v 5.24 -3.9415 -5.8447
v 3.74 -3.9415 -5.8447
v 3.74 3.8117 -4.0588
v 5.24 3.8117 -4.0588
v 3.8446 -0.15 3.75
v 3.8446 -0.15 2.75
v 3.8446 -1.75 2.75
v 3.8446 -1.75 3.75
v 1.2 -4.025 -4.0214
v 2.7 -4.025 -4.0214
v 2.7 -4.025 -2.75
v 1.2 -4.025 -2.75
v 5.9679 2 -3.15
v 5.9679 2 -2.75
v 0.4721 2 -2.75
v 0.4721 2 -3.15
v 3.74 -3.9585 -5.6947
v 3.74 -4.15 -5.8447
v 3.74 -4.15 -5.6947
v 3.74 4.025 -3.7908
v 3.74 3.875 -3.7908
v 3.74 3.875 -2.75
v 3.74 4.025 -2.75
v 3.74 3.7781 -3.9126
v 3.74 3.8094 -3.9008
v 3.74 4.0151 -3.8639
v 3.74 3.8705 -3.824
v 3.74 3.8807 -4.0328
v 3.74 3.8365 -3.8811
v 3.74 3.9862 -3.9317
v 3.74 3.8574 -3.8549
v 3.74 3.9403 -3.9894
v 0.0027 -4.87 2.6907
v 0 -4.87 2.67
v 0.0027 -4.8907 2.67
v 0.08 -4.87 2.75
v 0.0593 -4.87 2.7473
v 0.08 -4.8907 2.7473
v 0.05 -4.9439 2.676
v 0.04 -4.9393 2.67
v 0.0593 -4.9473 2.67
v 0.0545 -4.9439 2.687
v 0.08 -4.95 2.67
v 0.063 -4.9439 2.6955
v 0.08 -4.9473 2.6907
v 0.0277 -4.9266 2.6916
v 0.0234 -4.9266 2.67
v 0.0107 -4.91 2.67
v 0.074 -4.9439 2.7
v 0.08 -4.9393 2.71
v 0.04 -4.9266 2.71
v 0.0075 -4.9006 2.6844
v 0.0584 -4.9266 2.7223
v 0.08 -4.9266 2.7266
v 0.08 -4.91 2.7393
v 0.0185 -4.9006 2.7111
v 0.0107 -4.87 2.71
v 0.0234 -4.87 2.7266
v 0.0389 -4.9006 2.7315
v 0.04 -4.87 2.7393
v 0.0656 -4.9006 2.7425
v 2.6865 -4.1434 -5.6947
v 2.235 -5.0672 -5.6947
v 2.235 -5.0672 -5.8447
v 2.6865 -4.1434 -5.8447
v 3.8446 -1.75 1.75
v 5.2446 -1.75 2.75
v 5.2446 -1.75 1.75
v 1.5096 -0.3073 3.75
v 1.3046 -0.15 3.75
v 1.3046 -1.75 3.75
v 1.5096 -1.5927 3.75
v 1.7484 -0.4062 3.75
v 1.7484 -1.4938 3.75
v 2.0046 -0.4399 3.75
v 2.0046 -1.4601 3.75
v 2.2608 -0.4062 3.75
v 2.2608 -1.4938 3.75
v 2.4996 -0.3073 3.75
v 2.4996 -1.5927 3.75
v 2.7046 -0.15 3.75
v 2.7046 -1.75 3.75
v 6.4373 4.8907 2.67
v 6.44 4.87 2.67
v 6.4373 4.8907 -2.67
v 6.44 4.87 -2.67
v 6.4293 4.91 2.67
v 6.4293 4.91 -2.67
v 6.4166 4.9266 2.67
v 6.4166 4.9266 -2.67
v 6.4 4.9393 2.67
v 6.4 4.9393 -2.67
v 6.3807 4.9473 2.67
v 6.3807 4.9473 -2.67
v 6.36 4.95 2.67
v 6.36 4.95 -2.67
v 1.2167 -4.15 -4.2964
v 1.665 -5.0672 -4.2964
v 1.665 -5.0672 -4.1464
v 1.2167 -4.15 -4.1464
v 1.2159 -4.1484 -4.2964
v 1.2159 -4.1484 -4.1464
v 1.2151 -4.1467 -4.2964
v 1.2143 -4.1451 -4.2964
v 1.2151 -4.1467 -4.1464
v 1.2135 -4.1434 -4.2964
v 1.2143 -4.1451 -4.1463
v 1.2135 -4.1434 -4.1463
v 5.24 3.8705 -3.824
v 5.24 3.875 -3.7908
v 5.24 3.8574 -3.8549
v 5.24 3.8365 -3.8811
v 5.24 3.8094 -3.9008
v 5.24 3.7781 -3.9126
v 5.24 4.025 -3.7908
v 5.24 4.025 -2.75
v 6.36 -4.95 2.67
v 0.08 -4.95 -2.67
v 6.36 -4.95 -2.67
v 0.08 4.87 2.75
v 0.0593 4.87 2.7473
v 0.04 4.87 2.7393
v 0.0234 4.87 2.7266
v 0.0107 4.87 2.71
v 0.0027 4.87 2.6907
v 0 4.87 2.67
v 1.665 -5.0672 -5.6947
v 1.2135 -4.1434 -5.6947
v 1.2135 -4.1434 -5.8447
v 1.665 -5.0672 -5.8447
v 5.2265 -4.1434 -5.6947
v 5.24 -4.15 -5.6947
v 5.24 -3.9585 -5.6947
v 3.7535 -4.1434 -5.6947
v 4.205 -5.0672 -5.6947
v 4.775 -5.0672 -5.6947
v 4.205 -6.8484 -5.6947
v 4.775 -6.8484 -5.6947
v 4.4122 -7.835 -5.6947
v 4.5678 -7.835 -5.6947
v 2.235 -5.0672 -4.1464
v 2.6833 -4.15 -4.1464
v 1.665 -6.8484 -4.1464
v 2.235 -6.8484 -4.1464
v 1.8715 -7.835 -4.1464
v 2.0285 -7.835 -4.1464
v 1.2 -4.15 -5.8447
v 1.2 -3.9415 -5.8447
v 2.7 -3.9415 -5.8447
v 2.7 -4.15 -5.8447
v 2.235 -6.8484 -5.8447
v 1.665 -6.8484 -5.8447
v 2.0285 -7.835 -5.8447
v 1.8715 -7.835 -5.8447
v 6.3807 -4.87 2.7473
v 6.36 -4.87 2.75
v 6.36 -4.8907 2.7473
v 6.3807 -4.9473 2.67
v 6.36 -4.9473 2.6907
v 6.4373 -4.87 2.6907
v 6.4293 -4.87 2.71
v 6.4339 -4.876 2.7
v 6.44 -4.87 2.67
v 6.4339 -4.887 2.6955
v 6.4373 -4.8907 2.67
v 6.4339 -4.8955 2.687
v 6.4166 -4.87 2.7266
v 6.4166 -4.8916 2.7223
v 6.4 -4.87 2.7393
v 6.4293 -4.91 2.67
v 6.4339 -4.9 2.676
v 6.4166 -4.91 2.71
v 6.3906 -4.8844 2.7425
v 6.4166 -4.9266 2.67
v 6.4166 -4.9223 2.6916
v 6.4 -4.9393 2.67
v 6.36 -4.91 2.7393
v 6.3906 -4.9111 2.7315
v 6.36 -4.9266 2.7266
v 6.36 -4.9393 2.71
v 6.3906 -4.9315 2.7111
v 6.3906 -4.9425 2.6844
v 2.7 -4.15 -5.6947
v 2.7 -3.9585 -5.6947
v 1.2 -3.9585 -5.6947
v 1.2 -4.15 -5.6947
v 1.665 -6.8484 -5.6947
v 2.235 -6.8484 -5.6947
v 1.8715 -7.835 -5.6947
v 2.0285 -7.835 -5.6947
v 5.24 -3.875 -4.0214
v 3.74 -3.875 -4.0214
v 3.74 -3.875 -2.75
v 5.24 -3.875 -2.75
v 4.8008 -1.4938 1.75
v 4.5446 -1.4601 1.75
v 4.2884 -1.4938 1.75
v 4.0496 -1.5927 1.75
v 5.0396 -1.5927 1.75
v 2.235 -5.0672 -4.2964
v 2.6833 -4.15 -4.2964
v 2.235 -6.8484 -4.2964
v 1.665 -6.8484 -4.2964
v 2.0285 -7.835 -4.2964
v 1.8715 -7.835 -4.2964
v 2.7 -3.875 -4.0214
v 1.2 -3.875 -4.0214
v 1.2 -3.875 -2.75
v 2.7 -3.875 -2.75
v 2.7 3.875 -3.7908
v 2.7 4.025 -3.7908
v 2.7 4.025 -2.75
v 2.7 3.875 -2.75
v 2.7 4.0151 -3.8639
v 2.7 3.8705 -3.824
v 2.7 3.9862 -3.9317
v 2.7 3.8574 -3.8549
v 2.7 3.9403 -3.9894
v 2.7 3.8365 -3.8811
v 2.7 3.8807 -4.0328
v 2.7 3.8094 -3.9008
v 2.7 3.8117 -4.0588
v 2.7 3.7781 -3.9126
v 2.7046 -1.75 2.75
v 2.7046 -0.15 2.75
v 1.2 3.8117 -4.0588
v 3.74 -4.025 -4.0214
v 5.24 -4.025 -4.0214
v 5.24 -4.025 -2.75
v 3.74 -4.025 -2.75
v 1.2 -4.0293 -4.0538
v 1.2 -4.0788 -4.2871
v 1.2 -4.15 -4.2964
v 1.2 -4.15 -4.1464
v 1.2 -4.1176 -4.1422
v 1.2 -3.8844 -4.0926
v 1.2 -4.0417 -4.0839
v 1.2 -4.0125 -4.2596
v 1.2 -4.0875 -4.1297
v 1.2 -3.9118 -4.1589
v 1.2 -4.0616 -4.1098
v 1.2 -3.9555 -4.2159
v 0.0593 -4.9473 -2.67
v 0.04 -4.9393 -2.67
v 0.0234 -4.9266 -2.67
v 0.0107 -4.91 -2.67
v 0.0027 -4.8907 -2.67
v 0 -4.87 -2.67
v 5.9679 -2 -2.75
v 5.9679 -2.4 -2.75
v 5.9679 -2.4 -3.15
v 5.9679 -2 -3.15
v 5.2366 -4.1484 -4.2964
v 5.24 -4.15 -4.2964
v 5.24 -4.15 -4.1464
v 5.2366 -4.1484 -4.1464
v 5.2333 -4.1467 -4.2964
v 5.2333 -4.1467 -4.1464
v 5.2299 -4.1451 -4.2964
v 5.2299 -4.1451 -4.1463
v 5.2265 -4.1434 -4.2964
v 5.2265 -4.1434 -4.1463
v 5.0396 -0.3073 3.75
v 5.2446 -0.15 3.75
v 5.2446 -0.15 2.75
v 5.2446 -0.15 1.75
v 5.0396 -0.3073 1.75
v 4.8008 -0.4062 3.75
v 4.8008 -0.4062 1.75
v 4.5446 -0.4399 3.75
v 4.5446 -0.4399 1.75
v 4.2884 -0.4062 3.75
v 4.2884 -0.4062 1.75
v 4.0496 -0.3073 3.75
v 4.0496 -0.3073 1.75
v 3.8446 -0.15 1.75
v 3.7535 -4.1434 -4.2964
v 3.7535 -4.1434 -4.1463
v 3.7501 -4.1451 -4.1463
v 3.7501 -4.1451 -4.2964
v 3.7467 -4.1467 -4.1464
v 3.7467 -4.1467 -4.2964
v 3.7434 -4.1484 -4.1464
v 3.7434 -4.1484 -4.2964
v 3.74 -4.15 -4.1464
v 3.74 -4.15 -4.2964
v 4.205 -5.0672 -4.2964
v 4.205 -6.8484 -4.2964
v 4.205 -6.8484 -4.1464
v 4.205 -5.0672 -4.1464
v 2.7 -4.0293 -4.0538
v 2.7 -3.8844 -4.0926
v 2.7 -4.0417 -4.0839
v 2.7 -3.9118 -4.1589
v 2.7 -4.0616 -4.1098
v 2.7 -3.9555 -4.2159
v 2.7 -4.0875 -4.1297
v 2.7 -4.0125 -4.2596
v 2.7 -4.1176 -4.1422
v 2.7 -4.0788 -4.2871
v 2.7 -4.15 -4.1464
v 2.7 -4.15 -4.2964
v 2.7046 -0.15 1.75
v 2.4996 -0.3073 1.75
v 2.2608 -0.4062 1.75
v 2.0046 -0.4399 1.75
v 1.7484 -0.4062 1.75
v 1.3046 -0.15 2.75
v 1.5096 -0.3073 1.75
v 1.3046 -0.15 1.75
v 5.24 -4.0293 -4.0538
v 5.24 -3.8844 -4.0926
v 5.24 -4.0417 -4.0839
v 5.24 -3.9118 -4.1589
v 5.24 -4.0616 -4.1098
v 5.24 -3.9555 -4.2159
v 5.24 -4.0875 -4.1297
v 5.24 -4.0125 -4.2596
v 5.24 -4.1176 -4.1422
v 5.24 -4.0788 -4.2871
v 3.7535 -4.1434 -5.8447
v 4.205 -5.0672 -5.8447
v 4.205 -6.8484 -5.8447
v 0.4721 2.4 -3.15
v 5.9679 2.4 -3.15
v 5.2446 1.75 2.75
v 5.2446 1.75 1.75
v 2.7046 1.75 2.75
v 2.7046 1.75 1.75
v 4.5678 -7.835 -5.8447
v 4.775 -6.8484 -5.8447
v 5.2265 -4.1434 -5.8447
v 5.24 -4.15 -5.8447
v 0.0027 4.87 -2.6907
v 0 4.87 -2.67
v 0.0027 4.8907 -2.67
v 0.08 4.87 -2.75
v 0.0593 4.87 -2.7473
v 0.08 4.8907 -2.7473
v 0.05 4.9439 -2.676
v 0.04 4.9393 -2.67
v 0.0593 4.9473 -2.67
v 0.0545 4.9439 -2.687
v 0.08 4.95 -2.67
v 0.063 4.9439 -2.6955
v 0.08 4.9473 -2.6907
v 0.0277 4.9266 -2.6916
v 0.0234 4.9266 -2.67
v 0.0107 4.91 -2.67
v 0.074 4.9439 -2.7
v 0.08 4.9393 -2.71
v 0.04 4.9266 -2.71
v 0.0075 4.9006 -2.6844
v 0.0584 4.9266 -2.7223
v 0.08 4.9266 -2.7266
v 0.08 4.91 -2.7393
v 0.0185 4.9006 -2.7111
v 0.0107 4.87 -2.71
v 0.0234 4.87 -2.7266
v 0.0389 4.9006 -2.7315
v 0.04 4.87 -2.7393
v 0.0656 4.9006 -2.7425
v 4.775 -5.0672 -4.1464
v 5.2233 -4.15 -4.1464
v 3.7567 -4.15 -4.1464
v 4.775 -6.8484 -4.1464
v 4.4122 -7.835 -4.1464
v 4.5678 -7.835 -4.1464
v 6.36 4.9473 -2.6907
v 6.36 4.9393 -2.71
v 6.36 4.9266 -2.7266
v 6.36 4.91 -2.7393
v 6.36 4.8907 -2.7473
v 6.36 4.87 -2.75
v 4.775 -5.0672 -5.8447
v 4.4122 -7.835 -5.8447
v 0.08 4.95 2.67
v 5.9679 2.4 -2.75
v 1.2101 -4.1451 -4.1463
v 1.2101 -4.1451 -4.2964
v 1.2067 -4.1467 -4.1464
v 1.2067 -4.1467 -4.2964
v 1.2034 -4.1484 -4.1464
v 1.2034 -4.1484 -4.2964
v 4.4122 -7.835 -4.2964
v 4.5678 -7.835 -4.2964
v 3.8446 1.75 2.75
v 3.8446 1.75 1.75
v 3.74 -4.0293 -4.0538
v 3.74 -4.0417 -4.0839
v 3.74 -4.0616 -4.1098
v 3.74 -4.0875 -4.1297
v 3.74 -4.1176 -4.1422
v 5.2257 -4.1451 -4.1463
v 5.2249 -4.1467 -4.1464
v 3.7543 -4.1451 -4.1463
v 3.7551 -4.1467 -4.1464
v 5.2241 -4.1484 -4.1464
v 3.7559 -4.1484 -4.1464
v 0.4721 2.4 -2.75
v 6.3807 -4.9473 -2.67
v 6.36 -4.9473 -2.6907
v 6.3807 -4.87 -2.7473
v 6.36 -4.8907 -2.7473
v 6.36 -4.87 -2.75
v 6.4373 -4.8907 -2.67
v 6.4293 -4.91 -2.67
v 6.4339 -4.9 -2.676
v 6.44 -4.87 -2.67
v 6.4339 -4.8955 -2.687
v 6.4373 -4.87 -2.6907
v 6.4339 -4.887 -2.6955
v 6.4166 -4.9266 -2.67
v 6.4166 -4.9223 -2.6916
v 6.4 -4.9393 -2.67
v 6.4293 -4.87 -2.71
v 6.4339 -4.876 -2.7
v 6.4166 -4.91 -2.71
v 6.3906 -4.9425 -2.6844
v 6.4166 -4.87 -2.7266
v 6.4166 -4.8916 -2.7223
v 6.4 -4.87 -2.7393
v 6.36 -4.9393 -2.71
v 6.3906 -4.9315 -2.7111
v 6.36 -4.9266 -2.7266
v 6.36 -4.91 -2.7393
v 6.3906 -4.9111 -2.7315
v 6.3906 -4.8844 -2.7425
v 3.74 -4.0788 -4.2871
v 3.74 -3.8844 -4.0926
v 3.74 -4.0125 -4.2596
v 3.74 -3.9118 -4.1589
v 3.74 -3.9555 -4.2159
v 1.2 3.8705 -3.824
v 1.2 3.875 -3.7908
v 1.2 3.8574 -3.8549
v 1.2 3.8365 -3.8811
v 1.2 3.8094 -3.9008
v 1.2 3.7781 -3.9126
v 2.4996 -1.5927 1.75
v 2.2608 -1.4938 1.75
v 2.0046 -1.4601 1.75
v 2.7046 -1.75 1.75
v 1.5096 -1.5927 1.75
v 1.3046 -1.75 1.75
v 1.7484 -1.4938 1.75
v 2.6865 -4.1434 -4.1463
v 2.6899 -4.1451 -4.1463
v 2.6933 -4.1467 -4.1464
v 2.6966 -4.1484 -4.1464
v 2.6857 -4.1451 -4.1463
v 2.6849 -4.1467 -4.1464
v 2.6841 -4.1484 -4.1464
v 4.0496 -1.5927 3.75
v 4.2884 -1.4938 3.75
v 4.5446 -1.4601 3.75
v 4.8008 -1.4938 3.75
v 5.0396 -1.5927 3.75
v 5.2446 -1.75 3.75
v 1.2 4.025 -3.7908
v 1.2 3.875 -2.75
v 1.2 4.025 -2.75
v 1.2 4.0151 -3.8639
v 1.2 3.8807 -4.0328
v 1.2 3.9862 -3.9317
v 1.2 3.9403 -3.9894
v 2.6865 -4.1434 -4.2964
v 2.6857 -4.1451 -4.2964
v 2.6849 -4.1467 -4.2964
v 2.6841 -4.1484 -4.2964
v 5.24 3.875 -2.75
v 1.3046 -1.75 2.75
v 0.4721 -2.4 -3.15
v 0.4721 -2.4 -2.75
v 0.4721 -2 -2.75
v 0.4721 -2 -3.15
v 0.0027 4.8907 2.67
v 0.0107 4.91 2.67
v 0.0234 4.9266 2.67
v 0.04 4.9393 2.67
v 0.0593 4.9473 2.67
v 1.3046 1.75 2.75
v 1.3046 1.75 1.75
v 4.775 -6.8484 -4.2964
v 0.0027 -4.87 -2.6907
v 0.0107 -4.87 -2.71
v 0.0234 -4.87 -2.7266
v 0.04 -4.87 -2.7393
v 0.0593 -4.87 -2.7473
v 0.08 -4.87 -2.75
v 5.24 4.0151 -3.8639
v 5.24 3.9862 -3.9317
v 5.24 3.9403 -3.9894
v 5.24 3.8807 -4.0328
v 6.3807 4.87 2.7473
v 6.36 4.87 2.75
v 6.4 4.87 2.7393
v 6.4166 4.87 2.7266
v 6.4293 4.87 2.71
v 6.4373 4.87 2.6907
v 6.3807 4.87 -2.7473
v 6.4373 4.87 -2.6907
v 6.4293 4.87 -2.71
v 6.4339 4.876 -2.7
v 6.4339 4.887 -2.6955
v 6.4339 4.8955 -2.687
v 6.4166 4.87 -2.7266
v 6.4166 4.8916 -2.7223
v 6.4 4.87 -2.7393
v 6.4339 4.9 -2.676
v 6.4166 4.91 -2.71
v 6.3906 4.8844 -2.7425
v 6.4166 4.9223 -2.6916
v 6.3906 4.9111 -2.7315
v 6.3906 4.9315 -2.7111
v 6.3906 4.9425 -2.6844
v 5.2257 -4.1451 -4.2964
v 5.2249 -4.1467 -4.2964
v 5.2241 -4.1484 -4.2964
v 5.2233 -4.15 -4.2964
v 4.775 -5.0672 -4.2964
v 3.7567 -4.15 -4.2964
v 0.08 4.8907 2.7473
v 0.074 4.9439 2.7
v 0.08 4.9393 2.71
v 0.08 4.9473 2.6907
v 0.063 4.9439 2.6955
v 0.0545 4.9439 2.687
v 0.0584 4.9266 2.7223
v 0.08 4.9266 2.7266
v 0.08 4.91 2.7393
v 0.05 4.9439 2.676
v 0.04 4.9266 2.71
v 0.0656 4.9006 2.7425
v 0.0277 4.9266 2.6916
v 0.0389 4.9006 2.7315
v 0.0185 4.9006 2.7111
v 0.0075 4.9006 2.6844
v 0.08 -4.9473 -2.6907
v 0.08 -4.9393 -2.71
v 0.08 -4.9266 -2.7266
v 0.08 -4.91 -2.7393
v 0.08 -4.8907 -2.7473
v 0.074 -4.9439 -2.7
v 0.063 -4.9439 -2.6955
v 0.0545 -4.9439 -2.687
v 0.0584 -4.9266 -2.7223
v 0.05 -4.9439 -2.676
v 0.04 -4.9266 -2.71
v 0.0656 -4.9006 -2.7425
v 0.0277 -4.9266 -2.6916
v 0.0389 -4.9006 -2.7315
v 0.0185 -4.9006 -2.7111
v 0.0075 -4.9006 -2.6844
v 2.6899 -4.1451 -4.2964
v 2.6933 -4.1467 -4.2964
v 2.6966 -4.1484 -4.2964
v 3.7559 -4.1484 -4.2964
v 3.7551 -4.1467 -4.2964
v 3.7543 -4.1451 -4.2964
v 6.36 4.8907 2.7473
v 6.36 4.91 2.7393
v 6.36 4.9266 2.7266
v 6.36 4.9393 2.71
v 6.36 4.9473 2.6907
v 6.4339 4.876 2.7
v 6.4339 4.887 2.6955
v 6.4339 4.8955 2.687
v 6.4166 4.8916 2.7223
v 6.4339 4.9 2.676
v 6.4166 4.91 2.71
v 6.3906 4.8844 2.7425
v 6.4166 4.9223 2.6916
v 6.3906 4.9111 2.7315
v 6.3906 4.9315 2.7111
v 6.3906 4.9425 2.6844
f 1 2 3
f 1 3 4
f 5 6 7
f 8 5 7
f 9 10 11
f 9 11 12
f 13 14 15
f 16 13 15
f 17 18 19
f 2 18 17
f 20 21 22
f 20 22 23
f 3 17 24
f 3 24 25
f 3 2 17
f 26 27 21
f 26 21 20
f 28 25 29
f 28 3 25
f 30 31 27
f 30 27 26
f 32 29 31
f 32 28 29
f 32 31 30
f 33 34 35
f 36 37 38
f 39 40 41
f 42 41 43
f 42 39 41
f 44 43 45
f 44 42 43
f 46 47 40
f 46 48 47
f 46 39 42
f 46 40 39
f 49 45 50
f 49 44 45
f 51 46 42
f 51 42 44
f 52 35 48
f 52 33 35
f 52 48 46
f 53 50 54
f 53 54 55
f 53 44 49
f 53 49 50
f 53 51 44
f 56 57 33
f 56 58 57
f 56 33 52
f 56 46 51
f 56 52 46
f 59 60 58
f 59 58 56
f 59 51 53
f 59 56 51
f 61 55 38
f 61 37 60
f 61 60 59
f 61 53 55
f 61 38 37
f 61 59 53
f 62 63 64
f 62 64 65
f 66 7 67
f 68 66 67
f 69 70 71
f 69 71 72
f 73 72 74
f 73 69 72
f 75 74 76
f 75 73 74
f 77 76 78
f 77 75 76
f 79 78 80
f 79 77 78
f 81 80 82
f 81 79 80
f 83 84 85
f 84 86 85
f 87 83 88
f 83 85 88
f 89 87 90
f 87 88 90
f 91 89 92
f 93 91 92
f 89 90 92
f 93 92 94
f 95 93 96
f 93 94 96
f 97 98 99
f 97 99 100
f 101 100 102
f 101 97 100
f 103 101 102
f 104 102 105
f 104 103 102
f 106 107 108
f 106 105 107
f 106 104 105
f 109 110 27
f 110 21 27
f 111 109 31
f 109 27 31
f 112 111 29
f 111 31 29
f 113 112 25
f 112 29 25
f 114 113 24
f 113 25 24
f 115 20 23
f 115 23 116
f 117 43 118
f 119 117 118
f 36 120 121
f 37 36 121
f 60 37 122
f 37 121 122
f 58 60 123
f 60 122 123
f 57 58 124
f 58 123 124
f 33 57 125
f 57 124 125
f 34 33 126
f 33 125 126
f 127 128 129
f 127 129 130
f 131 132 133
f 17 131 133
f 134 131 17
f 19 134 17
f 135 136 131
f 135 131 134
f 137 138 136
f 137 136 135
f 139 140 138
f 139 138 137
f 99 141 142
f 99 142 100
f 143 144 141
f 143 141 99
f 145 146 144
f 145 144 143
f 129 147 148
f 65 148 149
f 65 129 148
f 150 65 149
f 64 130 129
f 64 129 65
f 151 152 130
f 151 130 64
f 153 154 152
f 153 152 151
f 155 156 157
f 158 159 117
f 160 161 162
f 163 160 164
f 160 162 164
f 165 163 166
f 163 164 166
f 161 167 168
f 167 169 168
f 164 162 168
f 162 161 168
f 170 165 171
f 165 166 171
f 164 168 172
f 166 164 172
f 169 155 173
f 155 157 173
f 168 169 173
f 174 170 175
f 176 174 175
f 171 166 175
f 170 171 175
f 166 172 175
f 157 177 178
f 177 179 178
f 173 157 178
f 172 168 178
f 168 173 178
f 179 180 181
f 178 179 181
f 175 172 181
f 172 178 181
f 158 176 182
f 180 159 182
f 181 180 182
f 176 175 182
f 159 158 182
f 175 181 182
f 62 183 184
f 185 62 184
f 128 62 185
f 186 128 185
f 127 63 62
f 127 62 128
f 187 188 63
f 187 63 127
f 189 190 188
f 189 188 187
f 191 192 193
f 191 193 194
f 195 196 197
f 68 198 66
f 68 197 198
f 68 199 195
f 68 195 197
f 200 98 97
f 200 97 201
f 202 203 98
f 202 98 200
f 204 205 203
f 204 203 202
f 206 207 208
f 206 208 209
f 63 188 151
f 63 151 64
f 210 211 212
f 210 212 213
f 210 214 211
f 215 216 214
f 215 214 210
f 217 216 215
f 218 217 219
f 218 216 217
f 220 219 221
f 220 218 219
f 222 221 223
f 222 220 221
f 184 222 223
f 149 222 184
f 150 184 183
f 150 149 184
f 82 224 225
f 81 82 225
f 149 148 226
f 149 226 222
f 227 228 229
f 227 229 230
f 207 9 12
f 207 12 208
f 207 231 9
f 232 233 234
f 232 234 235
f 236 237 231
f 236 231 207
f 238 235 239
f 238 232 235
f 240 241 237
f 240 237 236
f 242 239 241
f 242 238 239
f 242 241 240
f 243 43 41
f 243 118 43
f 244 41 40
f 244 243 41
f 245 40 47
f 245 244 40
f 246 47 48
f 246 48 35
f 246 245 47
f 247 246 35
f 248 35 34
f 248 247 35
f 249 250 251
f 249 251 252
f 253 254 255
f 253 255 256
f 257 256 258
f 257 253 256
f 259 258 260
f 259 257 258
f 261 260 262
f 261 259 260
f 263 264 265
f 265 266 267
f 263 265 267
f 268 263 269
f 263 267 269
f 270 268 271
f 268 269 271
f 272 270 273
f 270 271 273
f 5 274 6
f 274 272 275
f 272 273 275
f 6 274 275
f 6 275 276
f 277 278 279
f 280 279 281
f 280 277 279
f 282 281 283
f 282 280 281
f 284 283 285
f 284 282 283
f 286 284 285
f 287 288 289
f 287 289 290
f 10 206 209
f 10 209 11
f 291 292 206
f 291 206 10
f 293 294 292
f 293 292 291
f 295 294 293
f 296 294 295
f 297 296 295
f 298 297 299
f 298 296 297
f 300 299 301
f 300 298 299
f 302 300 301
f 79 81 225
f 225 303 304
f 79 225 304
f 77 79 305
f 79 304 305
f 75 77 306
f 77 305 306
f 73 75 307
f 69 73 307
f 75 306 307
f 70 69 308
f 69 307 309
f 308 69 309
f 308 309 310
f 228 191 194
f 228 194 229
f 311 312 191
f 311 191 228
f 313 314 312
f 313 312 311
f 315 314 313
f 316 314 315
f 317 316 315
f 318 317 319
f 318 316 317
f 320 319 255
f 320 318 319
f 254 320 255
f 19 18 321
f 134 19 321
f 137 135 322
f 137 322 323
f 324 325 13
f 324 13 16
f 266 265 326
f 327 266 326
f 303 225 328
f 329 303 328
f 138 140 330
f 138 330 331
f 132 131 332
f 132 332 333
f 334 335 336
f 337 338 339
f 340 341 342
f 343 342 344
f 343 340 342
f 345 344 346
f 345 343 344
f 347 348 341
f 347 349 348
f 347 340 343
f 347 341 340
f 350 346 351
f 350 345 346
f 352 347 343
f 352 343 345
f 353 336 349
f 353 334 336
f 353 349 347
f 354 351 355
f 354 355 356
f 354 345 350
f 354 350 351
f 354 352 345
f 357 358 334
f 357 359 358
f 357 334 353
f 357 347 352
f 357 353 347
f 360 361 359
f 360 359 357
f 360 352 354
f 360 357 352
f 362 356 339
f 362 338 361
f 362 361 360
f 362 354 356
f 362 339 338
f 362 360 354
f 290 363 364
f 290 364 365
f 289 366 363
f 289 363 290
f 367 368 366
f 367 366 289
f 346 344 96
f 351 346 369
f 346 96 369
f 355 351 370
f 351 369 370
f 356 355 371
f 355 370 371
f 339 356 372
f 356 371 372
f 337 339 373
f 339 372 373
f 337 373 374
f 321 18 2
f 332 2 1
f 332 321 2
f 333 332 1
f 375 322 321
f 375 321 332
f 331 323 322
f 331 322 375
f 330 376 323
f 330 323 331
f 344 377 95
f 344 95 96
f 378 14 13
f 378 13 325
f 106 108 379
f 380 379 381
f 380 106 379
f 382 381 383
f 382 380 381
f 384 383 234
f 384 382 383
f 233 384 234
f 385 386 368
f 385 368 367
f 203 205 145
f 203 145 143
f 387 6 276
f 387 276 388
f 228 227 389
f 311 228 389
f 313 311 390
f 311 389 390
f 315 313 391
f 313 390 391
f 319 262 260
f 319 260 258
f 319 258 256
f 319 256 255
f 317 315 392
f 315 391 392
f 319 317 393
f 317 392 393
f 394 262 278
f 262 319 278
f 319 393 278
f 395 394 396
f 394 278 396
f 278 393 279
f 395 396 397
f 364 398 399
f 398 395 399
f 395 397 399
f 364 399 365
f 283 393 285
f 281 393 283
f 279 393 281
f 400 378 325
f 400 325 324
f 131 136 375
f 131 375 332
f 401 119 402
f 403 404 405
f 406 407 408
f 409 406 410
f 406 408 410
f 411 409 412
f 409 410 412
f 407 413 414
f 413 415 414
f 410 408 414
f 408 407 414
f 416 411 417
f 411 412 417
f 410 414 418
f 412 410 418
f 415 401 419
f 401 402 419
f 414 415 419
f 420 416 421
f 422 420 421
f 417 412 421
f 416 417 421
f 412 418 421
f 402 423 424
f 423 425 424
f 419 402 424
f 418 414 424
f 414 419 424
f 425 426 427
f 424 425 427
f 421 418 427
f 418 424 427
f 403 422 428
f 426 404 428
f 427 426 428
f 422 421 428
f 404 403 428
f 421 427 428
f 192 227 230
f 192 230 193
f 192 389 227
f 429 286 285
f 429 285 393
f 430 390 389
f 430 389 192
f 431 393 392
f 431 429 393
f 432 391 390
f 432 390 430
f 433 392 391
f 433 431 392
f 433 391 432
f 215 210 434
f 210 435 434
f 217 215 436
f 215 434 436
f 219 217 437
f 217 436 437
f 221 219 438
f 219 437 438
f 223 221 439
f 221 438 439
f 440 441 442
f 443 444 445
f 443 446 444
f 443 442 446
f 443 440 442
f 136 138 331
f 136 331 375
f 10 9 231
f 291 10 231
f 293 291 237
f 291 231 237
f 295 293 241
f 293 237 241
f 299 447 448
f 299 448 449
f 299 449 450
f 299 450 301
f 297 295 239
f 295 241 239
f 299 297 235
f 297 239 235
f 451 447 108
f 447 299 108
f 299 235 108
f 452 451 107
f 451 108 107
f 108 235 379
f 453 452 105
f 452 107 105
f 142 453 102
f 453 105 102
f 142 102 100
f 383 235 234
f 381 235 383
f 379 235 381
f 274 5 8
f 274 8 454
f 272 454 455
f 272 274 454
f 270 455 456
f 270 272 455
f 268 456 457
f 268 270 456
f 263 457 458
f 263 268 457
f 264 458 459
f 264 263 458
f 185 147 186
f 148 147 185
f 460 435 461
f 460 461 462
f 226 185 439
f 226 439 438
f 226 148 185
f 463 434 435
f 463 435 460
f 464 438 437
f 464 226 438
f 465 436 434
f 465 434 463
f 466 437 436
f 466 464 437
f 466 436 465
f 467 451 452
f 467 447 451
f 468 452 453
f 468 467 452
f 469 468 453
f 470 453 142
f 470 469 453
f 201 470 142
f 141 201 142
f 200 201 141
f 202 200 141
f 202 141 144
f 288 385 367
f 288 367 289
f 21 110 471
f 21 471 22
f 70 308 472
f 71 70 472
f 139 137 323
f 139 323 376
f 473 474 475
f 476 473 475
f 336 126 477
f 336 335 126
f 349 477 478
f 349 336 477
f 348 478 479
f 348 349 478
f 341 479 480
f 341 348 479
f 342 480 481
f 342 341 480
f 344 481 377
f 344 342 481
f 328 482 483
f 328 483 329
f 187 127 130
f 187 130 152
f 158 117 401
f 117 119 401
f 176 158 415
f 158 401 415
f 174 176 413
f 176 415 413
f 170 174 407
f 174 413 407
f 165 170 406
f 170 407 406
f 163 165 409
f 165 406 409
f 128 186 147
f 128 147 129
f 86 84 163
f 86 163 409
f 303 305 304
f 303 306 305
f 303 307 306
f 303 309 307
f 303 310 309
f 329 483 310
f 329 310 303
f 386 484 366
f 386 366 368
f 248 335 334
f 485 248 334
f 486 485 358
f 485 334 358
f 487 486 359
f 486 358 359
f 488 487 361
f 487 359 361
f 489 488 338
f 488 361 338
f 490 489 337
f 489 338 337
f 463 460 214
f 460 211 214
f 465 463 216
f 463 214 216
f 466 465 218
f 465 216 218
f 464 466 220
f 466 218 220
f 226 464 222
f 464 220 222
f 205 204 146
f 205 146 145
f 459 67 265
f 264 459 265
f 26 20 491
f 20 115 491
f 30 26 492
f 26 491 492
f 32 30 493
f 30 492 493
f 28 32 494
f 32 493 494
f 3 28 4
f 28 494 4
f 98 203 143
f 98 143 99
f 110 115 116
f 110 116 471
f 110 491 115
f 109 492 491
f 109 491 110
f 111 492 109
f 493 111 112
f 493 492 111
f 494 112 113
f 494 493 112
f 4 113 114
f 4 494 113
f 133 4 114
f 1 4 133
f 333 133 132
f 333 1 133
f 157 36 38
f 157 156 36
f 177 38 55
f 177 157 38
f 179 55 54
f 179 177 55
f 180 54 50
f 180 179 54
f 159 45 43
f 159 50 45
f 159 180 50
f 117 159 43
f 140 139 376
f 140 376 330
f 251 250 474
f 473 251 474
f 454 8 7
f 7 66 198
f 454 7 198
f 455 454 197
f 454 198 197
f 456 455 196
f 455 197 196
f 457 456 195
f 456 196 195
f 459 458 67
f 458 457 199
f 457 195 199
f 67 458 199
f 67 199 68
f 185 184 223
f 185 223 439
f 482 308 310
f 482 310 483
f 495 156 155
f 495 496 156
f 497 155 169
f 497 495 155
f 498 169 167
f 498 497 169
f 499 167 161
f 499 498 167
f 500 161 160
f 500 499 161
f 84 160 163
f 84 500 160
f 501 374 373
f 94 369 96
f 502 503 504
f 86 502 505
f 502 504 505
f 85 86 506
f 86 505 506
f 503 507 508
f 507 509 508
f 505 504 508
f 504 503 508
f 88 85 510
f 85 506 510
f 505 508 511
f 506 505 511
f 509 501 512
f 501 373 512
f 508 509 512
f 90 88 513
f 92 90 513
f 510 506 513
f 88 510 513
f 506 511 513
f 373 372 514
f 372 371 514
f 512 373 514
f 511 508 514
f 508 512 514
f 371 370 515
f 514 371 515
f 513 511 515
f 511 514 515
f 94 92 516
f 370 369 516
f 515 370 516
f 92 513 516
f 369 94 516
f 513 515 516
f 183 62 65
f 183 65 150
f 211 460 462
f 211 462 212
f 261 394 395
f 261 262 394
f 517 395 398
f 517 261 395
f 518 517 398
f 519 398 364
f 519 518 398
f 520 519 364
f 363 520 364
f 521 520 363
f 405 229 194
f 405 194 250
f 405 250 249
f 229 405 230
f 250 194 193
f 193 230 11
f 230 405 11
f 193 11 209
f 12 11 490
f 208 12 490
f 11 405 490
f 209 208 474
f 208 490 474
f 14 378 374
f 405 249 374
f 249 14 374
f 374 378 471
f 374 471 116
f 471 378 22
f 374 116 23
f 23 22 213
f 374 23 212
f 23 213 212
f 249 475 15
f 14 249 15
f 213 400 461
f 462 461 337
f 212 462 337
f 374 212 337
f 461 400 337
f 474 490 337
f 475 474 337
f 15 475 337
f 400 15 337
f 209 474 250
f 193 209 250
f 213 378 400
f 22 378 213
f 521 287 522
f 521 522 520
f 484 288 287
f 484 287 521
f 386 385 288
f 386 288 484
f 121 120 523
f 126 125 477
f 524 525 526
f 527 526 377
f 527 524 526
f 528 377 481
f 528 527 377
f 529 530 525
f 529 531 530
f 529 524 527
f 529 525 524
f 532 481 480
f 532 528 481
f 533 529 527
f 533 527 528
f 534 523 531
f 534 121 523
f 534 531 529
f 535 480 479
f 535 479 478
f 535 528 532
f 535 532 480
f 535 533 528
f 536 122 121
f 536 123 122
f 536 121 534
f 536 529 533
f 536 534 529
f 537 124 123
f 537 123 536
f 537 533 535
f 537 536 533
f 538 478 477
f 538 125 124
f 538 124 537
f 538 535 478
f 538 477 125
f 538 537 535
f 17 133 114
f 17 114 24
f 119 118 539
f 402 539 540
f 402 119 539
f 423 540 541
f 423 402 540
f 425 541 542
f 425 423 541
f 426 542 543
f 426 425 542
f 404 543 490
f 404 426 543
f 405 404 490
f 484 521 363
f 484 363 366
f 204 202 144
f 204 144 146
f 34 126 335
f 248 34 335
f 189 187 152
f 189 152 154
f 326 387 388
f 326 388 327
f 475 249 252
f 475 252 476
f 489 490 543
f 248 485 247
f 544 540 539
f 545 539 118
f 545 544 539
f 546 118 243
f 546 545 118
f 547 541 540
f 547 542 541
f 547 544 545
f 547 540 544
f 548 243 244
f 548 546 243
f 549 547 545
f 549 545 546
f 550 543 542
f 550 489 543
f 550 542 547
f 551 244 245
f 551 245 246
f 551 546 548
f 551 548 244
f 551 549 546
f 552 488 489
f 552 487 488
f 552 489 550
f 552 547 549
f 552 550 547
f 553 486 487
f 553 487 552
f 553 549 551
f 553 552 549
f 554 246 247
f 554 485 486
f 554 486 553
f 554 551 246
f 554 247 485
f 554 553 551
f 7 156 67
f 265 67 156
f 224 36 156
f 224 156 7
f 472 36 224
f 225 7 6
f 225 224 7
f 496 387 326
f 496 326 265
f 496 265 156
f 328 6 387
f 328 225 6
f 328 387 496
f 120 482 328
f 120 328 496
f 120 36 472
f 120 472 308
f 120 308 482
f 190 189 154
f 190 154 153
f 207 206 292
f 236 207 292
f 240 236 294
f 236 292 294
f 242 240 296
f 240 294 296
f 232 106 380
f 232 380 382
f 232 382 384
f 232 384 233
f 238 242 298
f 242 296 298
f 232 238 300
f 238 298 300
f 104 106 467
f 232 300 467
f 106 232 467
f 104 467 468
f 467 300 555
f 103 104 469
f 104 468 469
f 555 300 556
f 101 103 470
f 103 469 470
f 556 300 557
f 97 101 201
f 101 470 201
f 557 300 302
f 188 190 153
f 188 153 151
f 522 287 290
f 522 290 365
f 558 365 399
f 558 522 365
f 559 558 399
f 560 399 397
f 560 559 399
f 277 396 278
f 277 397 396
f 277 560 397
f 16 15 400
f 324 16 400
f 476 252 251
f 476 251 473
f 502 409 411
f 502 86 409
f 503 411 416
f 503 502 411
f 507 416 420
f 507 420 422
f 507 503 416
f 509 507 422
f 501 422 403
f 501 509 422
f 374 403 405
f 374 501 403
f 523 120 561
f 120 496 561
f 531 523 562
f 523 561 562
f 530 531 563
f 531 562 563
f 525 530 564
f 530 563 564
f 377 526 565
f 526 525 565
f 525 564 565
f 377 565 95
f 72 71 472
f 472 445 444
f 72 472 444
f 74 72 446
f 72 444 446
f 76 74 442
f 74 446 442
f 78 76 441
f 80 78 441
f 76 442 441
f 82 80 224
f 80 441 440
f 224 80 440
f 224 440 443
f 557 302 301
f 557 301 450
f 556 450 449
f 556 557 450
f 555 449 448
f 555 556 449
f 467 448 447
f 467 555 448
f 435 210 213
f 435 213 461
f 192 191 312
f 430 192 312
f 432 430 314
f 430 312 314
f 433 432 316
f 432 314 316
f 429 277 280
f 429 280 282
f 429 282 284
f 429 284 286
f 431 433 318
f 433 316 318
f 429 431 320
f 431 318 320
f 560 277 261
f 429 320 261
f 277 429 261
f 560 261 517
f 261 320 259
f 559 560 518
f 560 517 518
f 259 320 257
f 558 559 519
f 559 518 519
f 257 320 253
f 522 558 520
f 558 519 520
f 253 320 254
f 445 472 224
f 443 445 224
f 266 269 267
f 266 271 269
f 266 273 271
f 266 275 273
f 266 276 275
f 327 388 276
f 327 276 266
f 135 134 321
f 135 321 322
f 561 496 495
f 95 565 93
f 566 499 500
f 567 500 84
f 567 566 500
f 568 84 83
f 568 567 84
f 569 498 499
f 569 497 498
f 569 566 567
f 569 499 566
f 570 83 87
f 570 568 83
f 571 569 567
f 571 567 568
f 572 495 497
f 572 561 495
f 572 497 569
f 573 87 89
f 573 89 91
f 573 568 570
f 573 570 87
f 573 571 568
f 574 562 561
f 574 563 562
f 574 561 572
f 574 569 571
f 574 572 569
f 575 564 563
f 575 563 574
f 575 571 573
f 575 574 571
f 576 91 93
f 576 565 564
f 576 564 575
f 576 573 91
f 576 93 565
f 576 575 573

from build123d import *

# Parameters (mm, degrees)
SKETCH_1_W               = 5.5
SKETCH_1_H               = 9.9
EXTRUDE_1_DEPTH          = 6.44
SKETCH_2_W               = 1.5
SKETCH_2_H               = 0.15
PATTERN_LINEAR_1_COUNT   = 2
PATTERN_LINEAR_1_PITCH   = 2.54
SKETCH_3_W               = 1.5
SKETCH_3_H               = 0.15
PATTERN_LINEAR_2_COUNT   = 2
PATTERN_LINEAR_2_PITCH   = 2.54
CUT_EXTRUDE_1_DEPTH      = 0.15
CUT_EXTRUDE_1_DEPTH_BACK = 0.15
CUT_EXTRUDE_4_DEPTH      = 0.15
CUT_EXTRUDE_4_DEPTH_BACK = 0.15
CUT_EXTRUDE_5_DEPTH      = 0.15
CUT_EXTRUDE_5_DEPTH_BACK = 0.15
CUT_EXTRUDE_6_DEPTH      = 0.15
CUT_EXTRUDE_6_DEPTH_BACK = 0.15
SKETCH_6_W               = 1.4
SKETCH_6_H               = 3.5
CUT_EXTRUDE_1_2_DEPTH    = 1
PATTERN_LINEAR_3_COUNT   = 2
PATTERN_LINEAR_3_PITCH   = 2.54
EXTRUDE_2_DEPTH          = 2
SKETCH_8_W               = 5.49587381
SKETCH_8_H               = 0.4
EXTRUDE_3_DEPTH          = 0.4
FILLET_1_R               = 0.08


with BuildPart() as part:
    # Эскиз1 → Вытянуть1 (new body)
    with BuildSketch(Plane(origin=(0, 0, 0), x_dir=(0, 0, -1), z_dir=(1, 0, 0))):
        Rectangle(SKETCH_1_W, SKETCH_1_H)
    extrude(amount=EXTRUDE_1_DEPTH)

    # По траектории1: sweep along a curve in space
    with BuildLine() as sweep_1_path:
        Line((4.49, 3.95, -2.75), (4.49, 3.95, -3.790830974))
        ThreePointArc((4.49, 3.95, -3.790830974), (4.49, 3.906490428, -3.915373119), (4.49, 3.794892541, -3.98572751))
        Line((4.49, 3.794892541, -3.98572751), (4.49, -3.95, -5.769688961))
        Line((4.49, -3.95, -5.769688961), (4.49, -7.85, -5.769688961))
    # Эскиз2 → По траектории1 (sweep)
    with BuildSketch(Plane(origin=(0, 0, -2.75), x_dir=(-1, 0, 0), z_dir=(0, 0, -1))):
        with Locations((-4.49, 3.95)):
            Rectangle(SKETCH_2_W, SKETCH_2_H)
    sweep_1 = sweep(path=sweep_1_path.line, transition=Transition.RIGHT)

    # Линейный массив1: По траектории1 ×2
    with Locations(*[(-i * PATTERN_LINEAR_1_PITCH, 0, 0) for i in range(1, PATTERN_LINEAR_1_COUNT)]):
        add(sweep_1)

    # По траектории2: sweep along a curve in space
    with BuildLine() as sweep_2_path:
        Line((4.49, -3.95, -2.75), (4.49, -3.95, -4.02144183))
        ThreePointArc((4.49, -3.95, -4.02144183), (4.49, -4.008578644, -4.162863187), (4.49, -4.15, -4.22144183))
        Line((4.49, -4.15, -4.22144183), (4.49, -7.85, -4.22144183))
    # Эскиз3 → По траектории2 (sweep)
    with BuildSketch(Plane(origin=(0, 0, -2.75), x_dir=(-1, 0, 0), z_dir=(0, 0, -1))):
        with Locations((-4.49, -3.95)):
            Rectangle(SKETCH_3_W, SKETCH_3_H)
    sweep_2 = sweep(path=sweep_2_path.line)

    # Линейный массив2: По траектории2 ×2
    with Locations(*[(-i * PATTERN_LINEAR_2_PITCH, 0, 0) for i in range(1, PATTERN_LINEAR_2_COUNT)]):
        add(sweep_2)

    # Эскиз4 → Cut-Extrude 1 (cut, two sides: drawn at the far end of the back side and taken through both)
    with BuildSketch(Plane(origin=(0, 0, -5.844688961), x_dir=(-1, 0, 0), z_dir=(0, 0, -1)).offset(-CUT_EXTRUDE_1_DEPTH_BACK)):
        Polygon((-1.21347651, -4.143413371), (-1.665, -5.067248723), (-1.665, -6.848447142), (-1.871476359, -7.835), (-2.028523641, -7.835), (-2.235, -6.848447142), (-2.235, -5.067248723), (-2.68652349, -4.143413371), (-2.71347651, -4.156586629), (-2.265, -5.074187736), (-2.265, -6.851552858), (-2.052894917, -7.865), (-1.847105083, -7.865), (-1.635, -6.851552858), (-1.635, -5.074187736), (-1.18652349, -4.156586629), align=None)
    extrude(amount=CUT_EXTRUDE_1_DEPTH + CUT_EXTRUDE_1_DEPTH_BACK, mode=Mode.SUBTRACT)


with BuildPart() as cut_extrude_1_kept_piece:
    # of the separate pieces the step leaves, the one the design keeps (cut_extrude_1_pieces_kept)
    add(part.part.solids().sort_by_distance((0, 4.95, 2.75))[0])

    # Эскиз4<4> → Вырез-Вытянуть-Тонкостенный4 (cut, two sides: drawn at the far end of the back side and taken through both)
    with BuildSketch(Plane(origin=(0, 0, -5.844688961), x_dir=(-1, 0, 0), z_dir=(0, 0, -1)).offset(-CUT_EXTRUDE_4_DEPTH_BACK)):
        Polygon((-1.21347651, -4.143413371), (-1.665, -5.067248723), (-1.665, -6.848447142), (-1.871476359, -7.835), (-2.028523641, -7.835), (-2.235, -6.848447142), (-2.235, -5.067248723), (-2.68652349, -4.143413371), (-2.71347651, -4.156586629), (-2.265, -5.074187736), (-2.265, -6.851552858), (-2.052894917, -7.865), (-1.847105083, -7.865), (-1.635, -6.851552858), (-1.635, -5.074187736), (-1.18652349, -4.156586629), align=None)
        Polygon((-5.25347651, -4.156586629), (-4.805, -5.074187736), (-4.805, -6.851558008), (-4.592177182, -7.865), (-4.387822818, -7.865), (-4.175, -6.851558008), (-4.175, -5.074187736), (-3.72652349, -4.156586629), (-3.75347651, -4.143413371), (-4.205, -5.067248723), (-4.205, -6.848441992), (-4.412177182, -7.835), (-4.567822818, -7.835), (-4.775, -6.848441992), (-4.775, -5.067248723), (-5.22652349, -4.143413371), align=None)
    extrude(amount=CUT_EXTRUDE_4_DEPTH + CUT_EXTRUDE_4_DEPTH_BACK, mode=Mode.SUBTRACT)


with BuildPart() as cut_extrude_4_kept_piece:
    # of the separate pieces the step leaves, the one the design keeps (cut_extrude_4_pieces_kept)
    add(cut_extrude_1_kept_piece.part.solids().sort_by_distance((0, 4.95, 2.75))[0])

    # Эскиз5 → Вырез-Вытянуть-Тонкостенный5 (cut, two sides: drawn at the far end of the back side and taken through both)
    with BuildSketch(Plane.XY.offset(-4.14644183).offset(-CUT_EXTRUDE_5_DEPTH_BACK)):
        Polygon((1.18652349, -4.156586629), (1.635, -5.074187736), (1.635, -6.851552858), (1.847105083, -7.865), (2.052894917, -7.865), (2.265, -6.851552858), (2.265, -5.074187736), (2.71347651, -4.156586629), (2.68652349, -4.143413371), (2.235, -5.067248723), (2.235, -6.848447142), (2.028523641, -7.835), (1.871476359, -7.835), (1.665, -6.848447142), (1.665, -5.067248723), (1.21347651, -4.143413371), align=None)
    extrude(amount=CUT_EXTRUDE_5_DEPTH + CUT_EXTRUDE_5_DEPTH_BACK, mode=Mode.SUBTRACT)


with BuildPart() as cut_extrude_5_kept_piece:
    # of the separate pieces the step leaves, the one the design keeps (cut_extrude_5_pieces_kept)
    add(cut_extrude_4_kept_piece.part.solids().sort_by_distance((0, 4.95, 2.75))[0])

    # Эскиз5<4> → Вырез-Вытянуть-Тонкостенный6 (cut, two sides: drawn at the far end of the back side and taken through both)
    with BuildSketch(Plane.XY.offset(-4.14644183).offset(-CUT_EXTRUDE_6_DEPTH_BACK)):
        Polygon((1.18652349, -4.156586629), (1.635, -5.074187736), (1.635, -6.851552858), (1.847105083, -7.865), (2.052894917, -7.865), (2.265, -6.851552858), (2.265, -5.074187736), (2.71347651, -4.156586629), (2.68652349, -4.143413371), (2.235, -5.067248723), (2.235, -6.848447142), (2.028523641, -7.835), (1.871476359, -7.835), (1.665, -6.848447142), (1.665, -5.067248723), (1.21347651, -4.143413371), align=None)
        Polygon((5.22652349, -4.143413371), (4.775, -5.067248723), (4.775, -6.848441992), (4.567822818, -7.835), (4.412177182, -7.835), (4.205, -6.848441992), (4.205, -5.067248723), (3.75347651, -4.143413371), (3.72652349, -4.156586629), (4.175, -5.074187736), (4.175, -6.851558008), (4.387822818, -7.865), (4.592177182, -7.865), (4.805, -6.851558008), (4.805, -5.074187736), (5.25347651, -4.156586629), align=None)
    extrude(amount=CUT_EXTRUDE_6_DEPTH + CUT_EXTRUDE_6_DEPTH_BACK, mode=Mode.SUBTRACT)


with BuildPart() as cut_extrude_6_kept_piece:
    # of the separate pieces the step leaves, the one the design keeps (cut_extrude_6_pieces_kept)
    add(cut_extrude_5_kept_piece.part.solids().sort_by_distance((0, 4.95, 2.75))[0])

    # Эскиз6 → Cut-Extrude 1 2 (cut)
    with BuildSketch(Plane.XY.offset(2.75)):
        with Locations((2.004611319, 0)):
            Rectangle(SKETCH_6_W, SKETCH_6_H)
    cut_extrude_1_2 = extrude(amount=-CUT_EXTRUDE_1_2_DEPTH, mode=Mode.SUBTRACT)

    # Линейный массив3: Cut-Extrude 1 2 ×2
    with Locations(*[(i * PATTERN_LINEAR_3_PITCH, 0, 0) for i in range(1, PATTERN_LINEAR_3_COUNT)]):
        add(cut_extrude_1_2, mode=Mode.SUBTRACT)

    # Эскиз7 → Вытянуть2 (add)
    with BuildSketch(Plane.XY.offset(1.75)):
        with BuildLine():
            Line((1.304611319, -0.15), (1.304611319, -1.75))
            ThreePointArc((1.304611319, -1.75), (2.004611319, -1.460050506), (2.704611319, -1.75))
            Line((2.704611319, -1.75), (2.704611319, -0.15))
            ThreePointArc((2.704611319, -0.15), (2.004611319, -0.439949494), (1.304611319, -0.15))
        make_face()
        with BuildLine():
            Line((3.844611319, -0.15), (3.844611319, -1.75))
            ThreePointArc((3.844611319, -1.75), (4.544611319, -1.460050506), (5.244611319, -1.75))
            Line((5.244611319, -1.75), (5.244611319, -0.15))
            ThreePointArc((5.244611319, -0.15), (4.544611319, -0.439949494), (3.844611319, -0.15))
        make_face()
    extrude(amount=EXTRUDE_2_DEPTH)

    # Эскиз8 → Вытянуть3 (add)
    with BuildSketch(Plane(origin=(0, 0, -2.75), x_dir=(-1, 0, 0), z_dir=(0, 0, -1))):
        with Locations((-3.22, 2.2)):
            Rectangle(SKETCH_8_W, SKETCH_8_H)
        with Locations((-3.22, -2.2)):
            Rectangle(SKETCH_8_W, SKETCH_8_H)
    extrude(amount=EXTRUDE_3_DEPTH)

    # Скругление1
    fillet_1_edges = [cut_extrude_6_kept_piece.edges().sort_by_distance(p)[0] for p in [
        (0, 0, -2.75),
        (3.22, -4.95, -2.75),
        (0, 0, 2.75),
        (3.22, 4.95, 2.75),
        (0, -4.95, 0),
        (3.22, -4.95, 2.75),
        (0, 4.95, 0),
        (3.22, 4.95, -2.75),
        (6.44, 0, 2.75),
        (6.44, -4.95, 0),
        (6.44, 0, -2.75),
        (6.44, 4.95, 0),
    ]]
    fillet(fillet_1_edges, radius=FILLET_1_R)


solid = cut_extrude_6_kept_piece.part
